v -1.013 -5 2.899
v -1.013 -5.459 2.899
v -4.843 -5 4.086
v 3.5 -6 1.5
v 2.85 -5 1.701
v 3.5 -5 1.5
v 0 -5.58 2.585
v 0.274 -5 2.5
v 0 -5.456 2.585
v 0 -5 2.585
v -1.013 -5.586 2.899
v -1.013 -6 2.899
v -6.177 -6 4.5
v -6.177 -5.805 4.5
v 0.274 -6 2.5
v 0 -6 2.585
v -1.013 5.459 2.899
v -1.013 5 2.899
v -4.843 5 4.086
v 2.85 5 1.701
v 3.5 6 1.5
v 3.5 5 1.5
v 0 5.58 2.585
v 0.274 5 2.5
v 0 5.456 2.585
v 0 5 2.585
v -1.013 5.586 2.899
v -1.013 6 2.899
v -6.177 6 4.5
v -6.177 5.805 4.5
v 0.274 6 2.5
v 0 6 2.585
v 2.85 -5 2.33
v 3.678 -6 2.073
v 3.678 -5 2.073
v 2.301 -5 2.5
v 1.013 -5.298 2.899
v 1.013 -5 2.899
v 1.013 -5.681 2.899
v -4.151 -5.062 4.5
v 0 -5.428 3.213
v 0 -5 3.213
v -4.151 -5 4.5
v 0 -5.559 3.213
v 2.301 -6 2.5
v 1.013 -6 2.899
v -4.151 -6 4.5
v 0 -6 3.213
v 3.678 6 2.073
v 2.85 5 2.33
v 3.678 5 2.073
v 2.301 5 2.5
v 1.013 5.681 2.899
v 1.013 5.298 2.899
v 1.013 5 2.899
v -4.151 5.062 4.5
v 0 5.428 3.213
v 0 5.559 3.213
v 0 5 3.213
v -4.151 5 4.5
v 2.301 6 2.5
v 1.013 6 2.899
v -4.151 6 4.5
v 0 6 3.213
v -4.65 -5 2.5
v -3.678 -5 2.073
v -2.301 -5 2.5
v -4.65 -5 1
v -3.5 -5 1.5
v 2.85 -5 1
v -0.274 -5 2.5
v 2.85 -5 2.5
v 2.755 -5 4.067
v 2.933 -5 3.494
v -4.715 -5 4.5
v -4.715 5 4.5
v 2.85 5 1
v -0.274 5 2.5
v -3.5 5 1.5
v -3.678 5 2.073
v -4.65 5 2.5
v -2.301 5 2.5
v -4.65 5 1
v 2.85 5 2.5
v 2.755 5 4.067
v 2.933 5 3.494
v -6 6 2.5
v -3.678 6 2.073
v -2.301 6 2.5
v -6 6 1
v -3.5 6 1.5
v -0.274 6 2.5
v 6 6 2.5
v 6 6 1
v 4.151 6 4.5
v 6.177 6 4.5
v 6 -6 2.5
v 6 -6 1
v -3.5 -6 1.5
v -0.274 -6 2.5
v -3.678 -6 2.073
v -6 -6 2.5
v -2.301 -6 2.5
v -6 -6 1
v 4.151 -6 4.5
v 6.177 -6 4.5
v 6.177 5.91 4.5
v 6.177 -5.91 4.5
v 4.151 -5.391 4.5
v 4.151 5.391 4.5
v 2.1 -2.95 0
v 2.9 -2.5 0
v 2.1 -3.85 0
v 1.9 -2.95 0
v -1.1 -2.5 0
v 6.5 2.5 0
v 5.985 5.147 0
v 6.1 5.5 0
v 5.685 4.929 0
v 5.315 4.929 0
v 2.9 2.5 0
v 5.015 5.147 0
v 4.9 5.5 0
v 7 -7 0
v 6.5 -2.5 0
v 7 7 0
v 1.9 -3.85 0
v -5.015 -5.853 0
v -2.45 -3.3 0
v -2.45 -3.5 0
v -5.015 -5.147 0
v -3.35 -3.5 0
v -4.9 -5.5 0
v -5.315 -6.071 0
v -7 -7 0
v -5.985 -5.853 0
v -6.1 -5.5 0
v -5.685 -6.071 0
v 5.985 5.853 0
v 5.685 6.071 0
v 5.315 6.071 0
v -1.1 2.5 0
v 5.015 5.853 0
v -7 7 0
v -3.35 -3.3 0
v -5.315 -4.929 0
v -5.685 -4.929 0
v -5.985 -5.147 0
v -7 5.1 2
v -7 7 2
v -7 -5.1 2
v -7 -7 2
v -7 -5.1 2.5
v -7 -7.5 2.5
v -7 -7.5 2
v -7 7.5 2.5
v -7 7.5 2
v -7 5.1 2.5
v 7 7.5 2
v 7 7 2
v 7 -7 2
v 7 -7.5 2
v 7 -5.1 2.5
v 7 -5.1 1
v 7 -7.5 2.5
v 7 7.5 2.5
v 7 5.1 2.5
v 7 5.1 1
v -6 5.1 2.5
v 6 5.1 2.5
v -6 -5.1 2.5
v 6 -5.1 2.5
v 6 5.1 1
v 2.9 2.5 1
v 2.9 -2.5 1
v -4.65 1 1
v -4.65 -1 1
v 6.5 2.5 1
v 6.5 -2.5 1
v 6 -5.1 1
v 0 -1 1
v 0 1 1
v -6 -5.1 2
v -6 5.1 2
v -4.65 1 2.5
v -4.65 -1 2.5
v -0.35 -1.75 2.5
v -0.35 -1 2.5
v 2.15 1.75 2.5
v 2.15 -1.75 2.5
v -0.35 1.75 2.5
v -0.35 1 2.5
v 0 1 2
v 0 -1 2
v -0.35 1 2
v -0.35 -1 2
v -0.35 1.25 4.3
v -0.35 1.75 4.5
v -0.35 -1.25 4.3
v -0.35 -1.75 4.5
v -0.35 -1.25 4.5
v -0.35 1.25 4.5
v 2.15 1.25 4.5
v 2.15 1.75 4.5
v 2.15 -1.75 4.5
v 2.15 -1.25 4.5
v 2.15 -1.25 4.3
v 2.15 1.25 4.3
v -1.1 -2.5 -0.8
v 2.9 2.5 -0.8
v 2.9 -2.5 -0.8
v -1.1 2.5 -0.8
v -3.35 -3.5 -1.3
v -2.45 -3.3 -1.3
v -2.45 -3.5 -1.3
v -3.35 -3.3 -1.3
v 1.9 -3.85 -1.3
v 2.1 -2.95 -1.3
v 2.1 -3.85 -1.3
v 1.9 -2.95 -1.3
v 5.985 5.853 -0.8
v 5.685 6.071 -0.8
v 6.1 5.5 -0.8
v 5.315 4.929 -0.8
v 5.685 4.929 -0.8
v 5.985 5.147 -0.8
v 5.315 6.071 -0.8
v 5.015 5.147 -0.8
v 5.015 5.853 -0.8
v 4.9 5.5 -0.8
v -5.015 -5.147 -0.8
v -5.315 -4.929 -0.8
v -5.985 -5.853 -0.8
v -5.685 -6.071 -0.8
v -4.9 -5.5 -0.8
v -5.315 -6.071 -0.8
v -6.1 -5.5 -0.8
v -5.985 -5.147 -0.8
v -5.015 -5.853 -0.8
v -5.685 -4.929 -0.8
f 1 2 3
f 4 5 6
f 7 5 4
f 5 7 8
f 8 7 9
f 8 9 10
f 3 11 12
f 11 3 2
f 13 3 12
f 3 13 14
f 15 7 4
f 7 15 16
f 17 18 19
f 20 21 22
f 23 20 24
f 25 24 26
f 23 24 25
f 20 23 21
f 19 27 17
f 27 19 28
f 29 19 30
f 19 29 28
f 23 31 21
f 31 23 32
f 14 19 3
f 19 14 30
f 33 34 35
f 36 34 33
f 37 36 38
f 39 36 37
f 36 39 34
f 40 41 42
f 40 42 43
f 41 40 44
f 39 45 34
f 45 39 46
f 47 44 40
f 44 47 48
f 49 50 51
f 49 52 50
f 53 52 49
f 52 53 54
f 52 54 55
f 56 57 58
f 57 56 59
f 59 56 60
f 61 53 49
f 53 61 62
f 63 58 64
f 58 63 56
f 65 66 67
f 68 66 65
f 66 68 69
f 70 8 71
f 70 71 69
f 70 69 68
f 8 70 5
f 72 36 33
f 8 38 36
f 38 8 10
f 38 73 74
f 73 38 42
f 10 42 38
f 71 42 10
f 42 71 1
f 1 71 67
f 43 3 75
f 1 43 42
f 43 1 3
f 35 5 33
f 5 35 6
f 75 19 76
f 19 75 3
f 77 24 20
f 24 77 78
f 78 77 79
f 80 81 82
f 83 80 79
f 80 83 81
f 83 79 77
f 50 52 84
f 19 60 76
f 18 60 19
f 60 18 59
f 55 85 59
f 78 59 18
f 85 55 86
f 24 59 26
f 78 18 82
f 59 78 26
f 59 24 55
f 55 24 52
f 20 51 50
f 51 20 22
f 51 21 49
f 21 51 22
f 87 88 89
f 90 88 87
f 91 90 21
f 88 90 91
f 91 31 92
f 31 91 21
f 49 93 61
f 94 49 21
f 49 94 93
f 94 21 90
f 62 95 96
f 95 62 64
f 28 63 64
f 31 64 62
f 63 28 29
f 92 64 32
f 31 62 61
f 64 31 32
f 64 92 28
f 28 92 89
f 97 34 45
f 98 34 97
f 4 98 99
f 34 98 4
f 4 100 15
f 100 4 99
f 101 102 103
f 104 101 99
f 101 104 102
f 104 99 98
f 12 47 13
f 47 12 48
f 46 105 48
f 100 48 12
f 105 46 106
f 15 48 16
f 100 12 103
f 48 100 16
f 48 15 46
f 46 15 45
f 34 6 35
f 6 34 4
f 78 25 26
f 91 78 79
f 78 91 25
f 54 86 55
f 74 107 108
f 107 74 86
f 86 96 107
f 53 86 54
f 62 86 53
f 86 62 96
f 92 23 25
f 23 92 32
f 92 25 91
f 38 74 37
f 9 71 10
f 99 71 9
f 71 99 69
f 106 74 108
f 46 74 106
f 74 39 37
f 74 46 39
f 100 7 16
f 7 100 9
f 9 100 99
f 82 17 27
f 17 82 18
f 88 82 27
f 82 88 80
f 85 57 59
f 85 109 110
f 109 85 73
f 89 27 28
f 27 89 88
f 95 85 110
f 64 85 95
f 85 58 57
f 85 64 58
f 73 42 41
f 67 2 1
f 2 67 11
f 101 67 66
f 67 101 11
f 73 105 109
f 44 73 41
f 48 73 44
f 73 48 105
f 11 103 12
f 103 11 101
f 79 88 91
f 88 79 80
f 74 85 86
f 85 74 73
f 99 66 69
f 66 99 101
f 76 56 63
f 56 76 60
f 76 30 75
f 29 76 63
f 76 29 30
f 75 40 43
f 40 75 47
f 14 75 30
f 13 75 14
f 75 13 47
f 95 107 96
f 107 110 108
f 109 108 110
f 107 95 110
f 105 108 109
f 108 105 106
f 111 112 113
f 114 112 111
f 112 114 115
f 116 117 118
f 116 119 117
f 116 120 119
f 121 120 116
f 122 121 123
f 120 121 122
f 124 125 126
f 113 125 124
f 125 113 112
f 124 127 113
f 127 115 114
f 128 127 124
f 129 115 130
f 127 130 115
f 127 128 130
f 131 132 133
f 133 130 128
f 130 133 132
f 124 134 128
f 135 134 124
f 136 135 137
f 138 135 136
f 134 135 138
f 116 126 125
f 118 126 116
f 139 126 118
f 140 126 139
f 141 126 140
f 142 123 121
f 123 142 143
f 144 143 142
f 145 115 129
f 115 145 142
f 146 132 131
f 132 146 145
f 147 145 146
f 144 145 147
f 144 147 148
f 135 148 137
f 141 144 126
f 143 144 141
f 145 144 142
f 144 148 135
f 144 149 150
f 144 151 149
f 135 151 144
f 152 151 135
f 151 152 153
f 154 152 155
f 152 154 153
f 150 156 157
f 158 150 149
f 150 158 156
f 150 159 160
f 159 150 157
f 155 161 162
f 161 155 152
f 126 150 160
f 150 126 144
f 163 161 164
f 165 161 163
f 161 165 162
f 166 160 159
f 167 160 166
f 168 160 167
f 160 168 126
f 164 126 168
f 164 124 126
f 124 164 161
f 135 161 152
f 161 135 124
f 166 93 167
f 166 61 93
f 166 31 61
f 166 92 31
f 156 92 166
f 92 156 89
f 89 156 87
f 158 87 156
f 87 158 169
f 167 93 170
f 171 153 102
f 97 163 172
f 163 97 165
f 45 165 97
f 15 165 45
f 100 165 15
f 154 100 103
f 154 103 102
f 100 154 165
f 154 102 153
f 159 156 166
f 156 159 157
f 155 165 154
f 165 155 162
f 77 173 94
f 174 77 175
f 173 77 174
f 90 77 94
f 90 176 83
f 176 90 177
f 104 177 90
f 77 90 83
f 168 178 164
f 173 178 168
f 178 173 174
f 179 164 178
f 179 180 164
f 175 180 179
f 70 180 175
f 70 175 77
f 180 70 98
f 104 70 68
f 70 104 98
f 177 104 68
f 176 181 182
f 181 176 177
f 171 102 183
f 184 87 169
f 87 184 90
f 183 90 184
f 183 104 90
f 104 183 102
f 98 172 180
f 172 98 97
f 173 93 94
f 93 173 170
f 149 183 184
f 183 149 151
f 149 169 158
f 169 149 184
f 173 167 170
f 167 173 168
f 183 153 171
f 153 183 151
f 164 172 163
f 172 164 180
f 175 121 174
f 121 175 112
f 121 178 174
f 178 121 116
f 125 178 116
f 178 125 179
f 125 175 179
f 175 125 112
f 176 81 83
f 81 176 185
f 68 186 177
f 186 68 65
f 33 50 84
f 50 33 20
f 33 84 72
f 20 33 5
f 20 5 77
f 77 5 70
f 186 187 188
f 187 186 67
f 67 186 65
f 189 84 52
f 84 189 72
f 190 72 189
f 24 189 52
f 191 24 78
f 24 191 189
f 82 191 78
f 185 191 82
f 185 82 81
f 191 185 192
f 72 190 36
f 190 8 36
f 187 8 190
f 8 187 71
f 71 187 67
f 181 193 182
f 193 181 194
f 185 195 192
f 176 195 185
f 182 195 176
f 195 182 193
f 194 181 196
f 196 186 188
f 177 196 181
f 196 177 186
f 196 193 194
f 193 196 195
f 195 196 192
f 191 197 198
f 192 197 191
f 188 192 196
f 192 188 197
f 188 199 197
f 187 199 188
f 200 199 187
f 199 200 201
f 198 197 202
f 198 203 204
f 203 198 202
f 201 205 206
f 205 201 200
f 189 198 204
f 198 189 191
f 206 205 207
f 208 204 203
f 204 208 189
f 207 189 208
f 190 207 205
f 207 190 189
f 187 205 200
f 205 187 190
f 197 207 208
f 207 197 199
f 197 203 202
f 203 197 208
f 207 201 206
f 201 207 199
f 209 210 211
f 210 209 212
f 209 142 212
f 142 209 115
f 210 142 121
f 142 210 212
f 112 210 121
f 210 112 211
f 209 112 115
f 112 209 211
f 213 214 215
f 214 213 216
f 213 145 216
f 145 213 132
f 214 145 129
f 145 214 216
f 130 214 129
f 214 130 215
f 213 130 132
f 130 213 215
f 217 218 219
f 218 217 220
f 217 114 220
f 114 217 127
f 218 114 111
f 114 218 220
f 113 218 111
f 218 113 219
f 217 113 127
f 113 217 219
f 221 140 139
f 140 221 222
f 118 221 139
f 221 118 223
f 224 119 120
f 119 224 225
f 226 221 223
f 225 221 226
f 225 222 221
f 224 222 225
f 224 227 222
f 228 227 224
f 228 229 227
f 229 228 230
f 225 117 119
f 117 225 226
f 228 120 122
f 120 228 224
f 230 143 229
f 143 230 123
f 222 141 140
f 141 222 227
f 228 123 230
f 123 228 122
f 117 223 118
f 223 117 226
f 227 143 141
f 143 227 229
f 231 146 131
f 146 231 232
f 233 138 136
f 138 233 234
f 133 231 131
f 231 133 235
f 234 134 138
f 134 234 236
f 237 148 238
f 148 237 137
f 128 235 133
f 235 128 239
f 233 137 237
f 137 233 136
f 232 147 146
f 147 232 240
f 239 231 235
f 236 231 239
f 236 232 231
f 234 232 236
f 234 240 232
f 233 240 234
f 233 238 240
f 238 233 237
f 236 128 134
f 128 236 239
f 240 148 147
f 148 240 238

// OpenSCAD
$fn = 10;

module kadomaru(r) {
//  offset(r = -r) offset(r = r) children();
    children();
}

// scissors
color([1, 1, 1, 0.3]) {
  scissor_thickness = 0.6;
  scissor_pos = 3;
  scissor_x = 13 - scissor_pos;
  scissor_y = 2 + 0.5 + scissor_thickness;
  scissor_length = sqrt(pow(scissor_x, 2) + pow(scissor_y, 2));
  scissor_angle = atan(scissor_y / scissor_x);
  difference () {
    union () {
      translate([- scissor_pos / 2, 0, scissor_y / 2 + 1.5])
        rotate([0, scissor_angle, 0])
          linear_extrude(scissor_thickness)
            difference() {
              square([scissor_length, 12], center = true);
              translate([1.5, 0]) square([10, 10], center = true);
            }
      translate([scissor_pos / 2, 0, scissor_y / 2 + 1.5])
        rotate([0, -scissor_angle, 0])
          linear_extrude(scissor_thickness)
            difference() {
              square([scissor_length, 12], center = true);
              translate([-3.5, 0]) square([10, 10], center = true);
            }
    }
    translate([0, 0, 4.5]) linear_extrude(2) square([14, 14], center = true);
  }
}

// housing (1)
difference () {
  union () {
    color([0.3, 0.3, 0.3]) linear_extrude(2) kadomaru(2) square([14, 14], center = true);
    color([0.3, 0.3, 0.3]) translate([0, 0, 2]) linear_extrude(0.5) kadomaru(2) square([14, 15], center = true);
  }
  color([0.3, 0.3, 0.3]) translate([0, 0, 1]) linear_extrude(1.501) square([12, 12], center = true);
  color([0.3, 0.3, 0.3]) translate([0, 0, 2]) linear_extrude(0.501) square([14.01, 10.2], center = true);
  color([0.3, 0.3, 0.3]) translate([2, 0, 1]) linear_extrude(1.501) square([12.01, 10.2], center = true);
  // led hole
  color([0.3, 0.3, 0.3]) translate([4.7, 0, -0.01]) linear_extrude(1.502) square([3.6, 5], center = true);
}

// housing (2)
difference() {
  union() {
    translate([-0.9, 0, 1]) color([0.3, 0.3, 0.3]) linear_extrude(1) square([7.5, 10], center = true);
    translate([-0.9, 0, 2]) color([0.8, 0.8, 0.8]) linear_extrude(0.5) square([7.5, 10], center = true);
  }
  translate([-20, - 2 / 2, 0]) cube([20, 2, 20]);
}

// stem
difference() {
  // 0.9 ... same as the center pin position
  color([0.5, 0.5, 1]) translate([0.9, 0, 2]) linear_extrude(2.5) square([2.5, 3.5], center = true);
  color([0.5, 0.5, 1]) translate([0.9, 0, 4.5 - 0.2]) linear_extrude(0.201) square([3, 2.5], center = true);
}

// pins
// 0.9 = 4 / 2 - 1.1
translate([0.9, 0, -0.8]) color([0.3, 0.3, 0.3]) linear_extrude(0.8) kadomaru(2) square([4, 5], center = true);
translate([-2.9, -3.4, -1.3]) color([0.5, 0.5, 0.5]) linear_extrude(1.3) square([0.9, 0.2], center = true);
translate([2, -3.4, -1.3]) color([0.5, 0.5, 0.5]) linear_extrude(1.3) square([0.2, 0.9], center = true);
translate([5.5, 5.5, -0.8]) color([0.3, 0.3, 0.3]) linear_extrude(0.8) circle(d = 1.2, center = true);
translate([-5.5, -5.5, -0.8]) color([0.3, 0.3, 0.3]) linear_extrude(0.8) circle(d = 1.2, center = true);
